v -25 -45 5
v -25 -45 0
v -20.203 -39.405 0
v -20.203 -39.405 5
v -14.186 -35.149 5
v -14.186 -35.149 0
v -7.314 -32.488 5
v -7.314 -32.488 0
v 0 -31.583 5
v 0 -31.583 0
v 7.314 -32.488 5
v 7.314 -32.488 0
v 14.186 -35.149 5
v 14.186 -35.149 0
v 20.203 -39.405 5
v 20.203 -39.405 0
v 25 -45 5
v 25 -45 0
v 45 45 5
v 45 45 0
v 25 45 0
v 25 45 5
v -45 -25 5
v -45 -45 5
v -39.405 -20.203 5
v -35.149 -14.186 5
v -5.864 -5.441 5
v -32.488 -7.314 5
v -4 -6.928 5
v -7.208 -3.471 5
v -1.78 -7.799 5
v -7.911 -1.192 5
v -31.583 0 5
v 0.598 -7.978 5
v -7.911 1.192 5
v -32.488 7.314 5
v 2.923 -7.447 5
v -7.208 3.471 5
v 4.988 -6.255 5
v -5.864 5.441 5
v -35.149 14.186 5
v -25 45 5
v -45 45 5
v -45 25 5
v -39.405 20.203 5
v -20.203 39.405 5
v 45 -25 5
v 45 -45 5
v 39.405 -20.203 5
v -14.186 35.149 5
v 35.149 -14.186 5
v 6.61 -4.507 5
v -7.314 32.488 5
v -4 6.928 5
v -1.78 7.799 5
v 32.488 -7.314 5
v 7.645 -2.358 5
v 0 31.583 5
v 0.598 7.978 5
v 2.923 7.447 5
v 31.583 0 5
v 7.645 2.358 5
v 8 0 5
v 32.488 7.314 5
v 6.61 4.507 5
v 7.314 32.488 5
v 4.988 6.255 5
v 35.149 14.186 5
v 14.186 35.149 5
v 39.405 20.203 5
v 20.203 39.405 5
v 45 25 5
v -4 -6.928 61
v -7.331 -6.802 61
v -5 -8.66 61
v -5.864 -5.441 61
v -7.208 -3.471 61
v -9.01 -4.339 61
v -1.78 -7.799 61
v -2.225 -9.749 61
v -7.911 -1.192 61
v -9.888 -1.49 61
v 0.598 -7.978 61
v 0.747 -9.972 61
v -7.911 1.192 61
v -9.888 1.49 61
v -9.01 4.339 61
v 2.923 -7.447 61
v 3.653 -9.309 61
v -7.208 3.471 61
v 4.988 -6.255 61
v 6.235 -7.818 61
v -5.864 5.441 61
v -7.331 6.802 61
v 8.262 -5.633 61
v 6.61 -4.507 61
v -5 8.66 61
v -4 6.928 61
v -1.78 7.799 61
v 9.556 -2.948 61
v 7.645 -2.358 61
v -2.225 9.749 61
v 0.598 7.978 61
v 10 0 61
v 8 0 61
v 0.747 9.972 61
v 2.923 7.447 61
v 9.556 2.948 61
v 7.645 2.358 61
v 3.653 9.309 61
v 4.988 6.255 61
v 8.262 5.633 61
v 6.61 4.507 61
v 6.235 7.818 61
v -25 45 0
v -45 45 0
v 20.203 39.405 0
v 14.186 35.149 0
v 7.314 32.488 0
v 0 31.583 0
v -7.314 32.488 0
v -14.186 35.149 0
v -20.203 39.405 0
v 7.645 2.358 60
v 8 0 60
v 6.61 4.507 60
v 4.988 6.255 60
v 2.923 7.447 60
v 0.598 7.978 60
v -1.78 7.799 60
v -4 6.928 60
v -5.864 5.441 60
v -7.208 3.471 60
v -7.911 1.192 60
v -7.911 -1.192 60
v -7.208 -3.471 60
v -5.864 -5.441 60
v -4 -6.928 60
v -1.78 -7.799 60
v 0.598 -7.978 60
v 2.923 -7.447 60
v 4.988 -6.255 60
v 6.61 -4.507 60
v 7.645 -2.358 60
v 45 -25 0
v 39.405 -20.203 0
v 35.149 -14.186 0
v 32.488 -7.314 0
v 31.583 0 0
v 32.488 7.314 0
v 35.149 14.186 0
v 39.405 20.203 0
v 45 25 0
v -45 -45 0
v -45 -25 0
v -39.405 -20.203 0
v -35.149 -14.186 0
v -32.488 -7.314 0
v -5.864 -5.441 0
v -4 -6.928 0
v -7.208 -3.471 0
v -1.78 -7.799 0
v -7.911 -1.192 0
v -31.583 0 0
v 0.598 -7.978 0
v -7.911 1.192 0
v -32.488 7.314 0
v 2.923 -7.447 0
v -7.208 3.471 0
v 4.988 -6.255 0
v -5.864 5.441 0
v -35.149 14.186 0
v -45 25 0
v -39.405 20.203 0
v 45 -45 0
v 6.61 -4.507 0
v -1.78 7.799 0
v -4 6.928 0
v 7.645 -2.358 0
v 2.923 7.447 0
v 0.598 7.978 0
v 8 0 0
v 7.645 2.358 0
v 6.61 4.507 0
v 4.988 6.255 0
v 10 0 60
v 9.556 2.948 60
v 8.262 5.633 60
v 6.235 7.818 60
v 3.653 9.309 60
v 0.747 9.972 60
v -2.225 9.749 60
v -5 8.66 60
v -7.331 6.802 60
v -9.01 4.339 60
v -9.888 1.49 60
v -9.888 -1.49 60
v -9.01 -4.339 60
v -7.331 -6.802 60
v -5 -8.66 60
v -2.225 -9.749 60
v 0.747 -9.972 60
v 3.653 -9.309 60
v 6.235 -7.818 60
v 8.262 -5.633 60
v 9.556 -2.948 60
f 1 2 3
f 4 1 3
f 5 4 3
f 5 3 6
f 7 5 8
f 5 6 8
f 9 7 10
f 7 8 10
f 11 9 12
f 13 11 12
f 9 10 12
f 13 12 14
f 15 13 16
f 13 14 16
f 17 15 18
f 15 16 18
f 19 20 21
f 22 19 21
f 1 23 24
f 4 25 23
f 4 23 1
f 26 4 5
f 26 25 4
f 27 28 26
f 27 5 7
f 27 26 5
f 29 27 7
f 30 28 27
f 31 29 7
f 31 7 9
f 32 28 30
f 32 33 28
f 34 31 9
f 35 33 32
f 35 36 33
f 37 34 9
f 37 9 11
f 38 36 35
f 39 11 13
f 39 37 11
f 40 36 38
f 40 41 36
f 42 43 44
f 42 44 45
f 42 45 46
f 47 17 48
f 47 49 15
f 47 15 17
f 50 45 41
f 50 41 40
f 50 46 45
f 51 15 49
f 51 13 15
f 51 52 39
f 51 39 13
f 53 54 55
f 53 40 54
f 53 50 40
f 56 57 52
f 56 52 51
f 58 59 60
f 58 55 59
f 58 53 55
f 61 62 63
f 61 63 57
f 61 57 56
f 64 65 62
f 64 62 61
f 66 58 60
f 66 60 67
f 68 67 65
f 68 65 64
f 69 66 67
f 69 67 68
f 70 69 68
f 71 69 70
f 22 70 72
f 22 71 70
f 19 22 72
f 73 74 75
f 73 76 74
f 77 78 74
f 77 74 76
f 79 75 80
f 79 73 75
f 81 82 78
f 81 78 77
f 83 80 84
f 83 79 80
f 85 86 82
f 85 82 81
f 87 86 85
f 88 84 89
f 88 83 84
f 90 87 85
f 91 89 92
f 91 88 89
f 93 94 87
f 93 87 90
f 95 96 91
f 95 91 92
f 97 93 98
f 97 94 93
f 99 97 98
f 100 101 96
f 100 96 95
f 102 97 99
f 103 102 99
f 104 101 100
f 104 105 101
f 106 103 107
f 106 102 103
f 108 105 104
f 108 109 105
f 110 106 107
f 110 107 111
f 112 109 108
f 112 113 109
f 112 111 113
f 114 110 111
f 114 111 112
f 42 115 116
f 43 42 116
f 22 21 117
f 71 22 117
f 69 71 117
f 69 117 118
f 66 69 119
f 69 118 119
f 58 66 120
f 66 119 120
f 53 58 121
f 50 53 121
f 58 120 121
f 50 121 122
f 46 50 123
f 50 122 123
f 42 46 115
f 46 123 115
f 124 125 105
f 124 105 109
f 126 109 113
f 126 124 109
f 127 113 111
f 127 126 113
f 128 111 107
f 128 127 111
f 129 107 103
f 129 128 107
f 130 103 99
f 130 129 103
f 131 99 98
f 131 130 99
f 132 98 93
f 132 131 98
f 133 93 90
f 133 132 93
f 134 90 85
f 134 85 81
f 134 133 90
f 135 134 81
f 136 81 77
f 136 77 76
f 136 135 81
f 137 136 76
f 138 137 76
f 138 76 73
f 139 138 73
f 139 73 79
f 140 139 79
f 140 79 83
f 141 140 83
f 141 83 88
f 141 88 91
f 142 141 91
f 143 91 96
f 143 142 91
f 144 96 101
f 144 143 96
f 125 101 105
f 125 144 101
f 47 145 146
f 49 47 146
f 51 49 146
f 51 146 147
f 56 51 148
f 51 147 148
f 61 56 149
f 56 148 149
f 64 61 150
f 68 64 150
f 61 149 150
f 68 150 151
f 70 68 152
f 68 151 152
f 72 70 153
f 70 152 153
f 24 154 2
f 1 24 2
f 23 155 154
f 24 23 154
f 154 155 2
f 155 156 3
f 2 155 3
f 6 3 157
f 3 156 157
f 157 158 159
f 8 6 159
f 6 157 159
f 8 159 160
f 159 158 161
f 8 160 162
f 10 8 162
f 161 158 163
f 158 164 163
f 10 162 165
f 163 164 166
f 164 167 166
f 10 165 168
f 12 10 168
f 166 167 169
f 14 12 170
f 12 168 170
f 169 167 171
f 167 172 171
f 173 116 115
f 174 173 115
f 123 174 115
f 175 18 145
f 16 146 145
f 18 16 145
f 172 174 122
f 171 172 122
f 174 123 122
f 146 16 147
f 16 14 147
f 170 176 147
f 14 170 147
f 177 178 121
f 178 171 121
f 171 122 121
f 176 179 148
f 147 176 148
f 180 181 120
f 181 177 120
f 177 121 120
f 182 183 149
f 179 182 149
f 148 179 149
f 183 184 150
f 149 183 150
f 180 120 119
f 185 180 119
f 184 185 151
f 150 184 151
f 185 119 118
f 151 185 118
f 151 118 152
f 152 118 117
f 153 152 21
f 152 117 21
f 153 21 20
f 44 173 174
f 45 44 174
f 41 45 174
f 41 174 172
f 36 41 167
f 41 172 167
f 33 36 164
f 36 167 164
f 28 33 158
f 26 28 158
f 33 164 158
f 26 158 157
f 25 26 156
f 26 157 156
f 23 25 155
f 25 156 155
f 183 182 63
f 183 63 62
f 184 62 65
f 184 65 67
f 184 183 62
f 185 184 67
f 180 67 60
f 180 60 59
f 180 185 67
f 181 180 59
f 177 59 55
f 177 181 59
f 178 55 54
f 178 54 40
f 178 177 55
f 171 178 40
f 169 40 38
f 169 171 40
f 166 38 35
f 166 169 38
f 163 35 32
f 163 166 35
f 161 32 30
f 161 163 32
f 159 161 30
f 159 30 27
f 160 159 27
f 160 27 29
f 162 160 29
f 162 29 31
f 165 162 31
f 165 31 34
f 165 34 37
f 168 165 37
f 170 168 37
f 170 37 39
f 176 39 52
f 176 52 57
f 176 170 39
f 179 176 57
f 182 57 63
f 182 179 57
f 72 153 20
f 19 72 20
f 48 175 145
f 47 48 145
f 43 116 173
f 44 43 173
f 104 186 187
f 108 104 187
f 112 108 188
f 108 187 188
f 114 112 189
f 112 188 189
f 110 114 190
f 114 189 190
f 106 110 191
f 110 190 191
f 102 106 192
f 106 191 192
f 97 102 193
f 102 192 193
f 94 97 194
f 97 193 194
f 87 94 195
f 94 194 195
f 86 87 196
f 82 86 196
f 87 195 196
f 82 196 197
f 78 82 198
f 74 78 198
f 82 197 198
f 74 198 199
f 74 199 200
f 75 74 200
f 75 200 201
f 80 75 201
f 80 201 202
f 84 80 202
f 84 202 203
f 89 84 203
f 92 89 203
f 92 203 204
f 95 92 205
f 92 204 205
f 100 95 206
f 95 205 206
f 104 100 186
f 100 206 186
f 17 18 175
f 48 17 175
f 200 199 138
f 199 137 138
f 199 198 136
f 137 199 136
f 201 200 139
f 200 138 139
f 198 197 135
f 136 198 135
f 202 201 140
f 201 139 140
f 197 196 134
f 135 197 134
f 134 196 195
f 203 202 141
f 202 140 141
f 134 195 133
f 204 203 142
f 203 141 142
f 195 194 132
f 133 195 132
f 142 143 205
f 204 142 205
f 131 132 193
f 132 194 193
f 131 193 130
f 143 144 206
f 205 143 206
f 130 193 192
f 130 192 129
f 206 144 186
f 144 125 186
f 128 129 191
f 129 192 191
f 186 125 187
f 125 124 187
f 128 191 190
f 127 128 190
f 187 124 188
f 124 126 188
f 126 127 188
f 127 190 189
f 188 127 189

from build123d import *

# Parameters (mm, degrees)
F0_R     = 8
F3_DEPTH = 5
F2_R     = 10
F2_R_2   = 8
F4_DEPTH = 1


with BuildPart() as f3:
    # F0 (on Top) → F3 (new body)
    with BuildSketch(Plane.XY):
        with BuildLine():
            Line((25, -45), (45, -45))
            Line((45, -45), (45, -25))
            ThreePointArc((45, -25), (31.583124, 0), (45, 25))
            Line((45, 25), (45, 45))
            Line((45, 45), (25, 45))
            ThreePointArc((25, 45), (0, 31.583124), (-25, 45))
            Line((-25, 45), (-45, 45))
            Line((-45, 45), (-45, 25))
            ThreePointArc((-45, 25), (-31.583124, 0), (-45, -25))
            Line((-45, -25), (-45, -45))
            Line((-45, -45), (-25, -45))
            ThreePointArc((-25, -45), (0, -31.583124), (25, -45))
        make_face()
        Circle(F0_R, mode=Mode.SUBTRACT)
    extrude(amount=F3_DEPTH)


with BuildPart() as f4:
    # F2 (on offset) → F4 (new body)
    with BuildSketch(Plane.XY.offset(60)):
        Circle(F2_R)
        Circle(F2_R_2, mode=Mode.SUBTRACT)
    extrude(amount=F4_DEPTH)


solid = Compound([f3.part, f4.part])
